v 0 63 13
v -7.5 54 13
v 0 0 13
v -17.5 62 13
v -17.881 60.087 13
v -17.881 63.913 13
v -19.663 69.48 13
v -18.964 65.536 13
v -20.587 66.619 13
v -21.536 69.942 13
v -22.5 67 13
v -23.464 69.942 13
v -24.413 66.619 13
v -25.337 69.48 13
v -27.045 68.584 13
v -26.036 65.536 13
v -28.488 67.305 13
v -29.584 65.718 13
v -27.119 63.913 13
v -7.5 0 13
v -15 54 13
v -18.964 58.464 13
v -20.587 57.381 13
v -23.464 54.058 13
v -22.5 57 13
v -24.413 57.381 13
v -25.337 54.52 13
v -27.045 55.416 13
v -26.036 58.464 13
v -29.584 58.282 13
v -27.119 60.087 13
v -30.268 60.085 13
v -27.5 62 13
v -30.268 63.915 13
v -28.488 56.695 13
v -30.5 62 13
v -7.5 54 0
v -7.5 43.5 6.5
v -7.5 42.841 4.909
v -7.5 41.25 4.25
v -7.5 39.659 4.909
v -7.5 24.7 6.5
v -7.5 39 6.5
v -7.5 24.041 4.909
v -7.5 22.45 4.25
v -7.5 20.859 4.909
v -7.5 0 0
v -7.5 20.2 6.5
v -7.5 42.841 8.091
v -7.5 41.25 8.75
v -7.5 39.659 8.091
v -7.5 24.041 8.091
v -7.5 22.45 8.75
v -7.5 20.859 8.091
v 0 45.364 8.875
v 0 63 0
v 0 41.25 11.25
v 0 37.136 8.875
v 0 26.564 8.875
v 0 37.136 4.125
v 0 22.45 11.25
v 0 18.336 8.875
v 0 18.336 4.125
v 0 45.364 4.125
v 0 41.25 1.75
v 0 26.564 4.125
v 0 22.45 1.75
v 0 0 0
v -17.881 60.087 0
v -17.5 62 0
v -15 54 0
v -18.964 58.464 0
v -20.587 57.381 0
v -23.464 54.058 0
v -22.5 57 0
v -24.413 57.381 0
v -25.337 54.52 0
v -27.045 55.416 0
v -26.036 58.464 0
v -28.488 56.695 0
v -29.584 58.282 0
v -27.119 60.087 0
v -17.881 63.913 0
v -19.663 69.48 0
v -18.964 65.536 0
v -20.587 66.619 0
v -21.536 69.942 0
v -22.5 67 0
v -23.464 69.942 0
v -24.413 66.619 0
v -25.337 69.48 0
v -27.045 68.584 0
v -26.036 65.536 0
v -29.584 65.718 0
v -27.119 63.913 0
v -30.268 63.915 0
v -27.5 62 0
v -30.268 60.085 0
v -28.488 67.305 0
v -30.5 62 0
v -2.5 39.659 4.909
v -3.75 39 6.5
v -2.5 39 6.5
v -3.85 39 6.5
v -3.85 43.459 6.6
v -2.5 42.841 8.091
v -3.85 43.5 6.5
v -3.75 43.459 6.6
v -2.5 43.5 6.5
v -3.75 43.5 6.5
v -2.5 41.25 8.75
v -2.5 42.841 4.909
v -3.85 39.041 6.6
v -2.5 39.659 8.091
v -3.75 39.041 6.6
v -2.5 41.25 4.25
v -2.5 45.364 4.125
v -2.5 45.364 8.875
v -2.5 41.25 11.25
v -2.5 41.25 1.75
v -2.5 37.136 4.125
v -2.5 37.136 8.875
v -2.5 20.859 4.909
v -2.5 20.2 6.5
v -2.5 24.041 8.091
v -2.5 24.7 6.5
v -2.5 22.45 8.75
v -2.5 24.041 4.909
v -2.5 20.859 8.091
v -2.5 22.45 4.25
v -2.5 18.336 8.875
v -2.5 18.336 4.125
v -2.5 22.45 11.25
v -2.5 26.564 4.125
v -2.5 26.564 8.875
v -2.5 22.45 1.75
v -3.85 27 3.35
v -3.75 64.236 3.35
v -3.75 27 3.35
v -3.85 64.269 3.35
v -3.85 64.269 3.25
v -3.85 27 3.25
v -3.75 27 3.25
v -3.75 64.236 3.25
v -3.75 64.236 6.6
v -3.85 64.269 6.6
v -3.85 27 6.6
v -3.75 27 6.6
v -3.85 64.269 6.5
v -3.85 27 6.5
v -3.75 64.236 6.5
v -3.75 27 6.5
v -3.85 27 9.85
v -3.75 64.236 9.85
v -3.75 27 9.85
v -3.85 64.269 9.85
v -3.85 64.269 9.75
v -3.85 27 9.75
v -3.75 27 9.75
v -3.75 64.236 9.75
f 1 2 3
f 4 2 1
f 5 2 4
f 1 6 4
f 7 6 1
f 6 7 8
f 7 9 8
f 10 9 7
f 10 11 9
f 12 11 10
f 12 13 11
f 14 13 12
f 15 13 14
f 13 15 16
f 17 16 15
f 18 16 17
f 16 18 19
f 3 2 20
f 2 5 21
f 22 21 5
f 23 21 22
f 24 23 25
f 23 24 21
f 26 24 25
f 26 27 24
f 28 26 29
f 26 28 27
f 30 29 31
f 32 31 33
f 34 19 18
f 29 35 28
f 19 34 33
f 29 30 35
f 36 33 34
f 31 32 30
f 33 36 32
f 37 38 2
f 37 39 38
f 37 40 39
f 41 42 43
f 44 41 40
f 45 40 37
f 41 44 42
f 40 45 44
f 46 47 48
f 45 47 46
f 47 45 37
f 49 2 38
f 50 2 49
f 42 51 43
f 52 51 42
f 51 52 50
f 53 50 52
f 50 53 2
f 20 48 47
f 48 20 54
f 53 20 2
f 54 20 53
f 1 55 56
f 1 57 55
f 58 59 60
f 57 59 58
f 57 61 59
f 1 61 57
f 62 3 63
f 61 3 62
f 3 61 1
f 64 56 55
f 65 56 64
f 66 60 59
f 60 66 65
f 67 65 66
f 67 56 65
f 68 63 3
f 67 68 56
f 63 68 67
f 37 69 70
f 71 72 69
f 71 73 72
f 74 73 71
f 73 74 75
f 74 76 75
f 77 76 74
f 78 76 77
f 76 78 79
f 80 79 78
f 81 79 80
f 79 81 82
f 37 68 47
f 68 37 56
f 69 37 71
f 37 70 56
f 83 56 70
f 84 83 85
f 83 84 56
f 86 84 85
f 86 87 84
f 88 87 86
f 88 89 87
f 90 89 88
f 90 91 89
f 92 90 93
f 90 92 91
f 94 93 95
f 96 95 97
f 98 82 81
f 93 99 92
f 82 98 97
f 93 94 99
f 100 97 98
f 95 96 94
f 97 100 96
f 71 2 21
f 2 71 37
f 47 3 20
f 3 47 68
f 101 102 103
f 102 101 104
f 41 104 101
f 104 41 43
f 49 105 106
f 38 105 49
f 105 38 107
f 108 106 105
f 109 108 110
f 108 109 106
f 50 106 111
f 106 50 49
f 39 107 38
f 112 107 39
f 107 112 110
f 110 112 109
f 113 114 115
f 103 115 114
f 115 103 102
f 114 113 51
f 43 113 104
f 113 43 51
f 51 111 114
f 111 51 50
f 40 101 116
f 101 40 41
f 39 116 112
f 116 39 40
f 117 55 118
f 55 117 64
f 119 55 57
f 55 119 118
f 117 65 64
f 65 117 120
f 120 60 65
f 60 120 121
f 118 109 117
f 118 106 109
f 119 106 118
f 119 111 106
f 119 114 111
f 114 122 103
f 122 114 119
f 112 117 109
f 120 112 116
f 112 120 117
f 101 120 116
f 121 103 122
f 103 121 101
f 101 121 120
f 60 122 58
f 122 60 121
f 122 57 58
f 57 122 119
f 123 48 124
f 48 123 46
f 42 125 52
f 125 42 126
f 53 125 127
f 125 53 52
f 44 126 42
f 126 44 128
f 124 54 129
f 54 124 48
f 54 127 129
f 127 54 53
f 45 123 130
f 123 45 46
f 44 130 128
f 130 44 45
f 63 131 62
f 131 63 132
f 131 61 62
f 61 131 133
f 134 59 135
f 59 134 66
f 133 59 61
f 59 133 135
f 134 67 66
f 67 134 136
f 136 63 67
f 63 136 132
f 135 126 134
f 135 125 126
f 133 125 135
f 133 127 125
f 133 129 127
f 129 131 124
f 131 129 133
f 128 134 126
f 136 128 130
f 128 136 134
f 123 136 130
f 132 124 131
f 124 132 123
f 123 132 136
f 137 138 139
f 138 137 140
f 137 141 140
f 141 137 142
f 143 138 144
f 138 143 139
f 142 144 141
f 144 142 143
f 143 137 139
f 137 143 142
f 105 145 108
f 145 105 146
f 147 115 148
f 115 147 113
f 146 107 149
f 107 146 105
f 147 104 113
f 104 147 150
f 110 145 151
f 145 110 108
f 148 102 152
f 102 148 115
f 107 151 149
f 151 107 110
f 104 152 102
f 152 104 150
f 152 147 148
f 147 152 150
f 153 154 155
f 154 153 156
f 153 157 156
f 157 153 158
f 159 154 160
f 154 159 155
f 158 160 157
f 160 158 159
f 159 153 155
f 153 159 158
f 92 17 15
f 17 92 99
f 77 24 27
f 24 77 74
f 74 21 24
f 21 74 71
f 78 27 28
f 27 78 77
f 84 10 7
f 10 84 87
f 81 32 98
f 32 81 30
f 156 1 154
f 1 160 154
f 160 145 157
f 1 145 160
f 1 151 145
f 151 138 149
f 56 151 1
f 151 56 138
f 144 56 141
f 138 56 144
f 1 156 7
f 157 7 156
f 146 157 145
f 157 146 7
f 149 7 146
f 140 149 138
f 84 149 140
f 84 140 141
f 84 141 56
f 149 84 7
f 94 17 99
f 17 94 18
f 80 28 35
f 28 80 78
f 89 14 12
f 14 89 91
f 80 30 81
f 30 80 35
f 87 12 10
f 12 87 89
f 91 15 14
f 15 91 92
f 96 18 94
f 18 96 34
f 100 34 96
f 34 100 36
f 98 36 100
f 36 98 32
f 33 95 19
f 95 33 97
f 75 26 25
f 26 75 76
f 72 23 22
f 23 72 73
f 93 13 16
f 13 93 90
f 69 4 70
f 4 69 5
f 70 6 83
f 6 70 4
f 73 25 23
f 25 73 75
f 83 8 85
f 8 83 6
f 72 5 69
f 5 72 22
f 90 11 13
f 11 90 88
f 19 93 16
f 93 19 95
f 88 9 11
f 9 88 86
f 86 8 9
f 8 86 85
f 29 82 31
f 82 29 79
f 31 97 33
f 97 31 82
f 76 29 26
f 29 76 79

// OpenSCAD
// Lower Toilet Seat Hinge Bracket
// Designed by Mike Creuzer Dec 30 2012 -  thingiverse@creuzer.com

// measurements are as the part is in use using the bottom back edge of the seat as reference for all measurements
// rotated on its side for printing when done

//Bracket bit

BracketWidth = 13; 
BracketLength = 54; 
BracketHeight = 7.5;

// Hinge upright bit to center of hinge hole
HingeWidth = BracketWidth; 
HingeLength = 9; 
HingeHeight = 15;

// Hinge Hole
//Radius
HingeHoleRadius = 5;
HingeHoleWallThickness = 3;
// Smaller number is smoother circle & slower rendering
HingeHoleRoundness = 0.01; 

//Mounting Holes
// diameter
MountingHoleSize = 4.5; 
// diameter
MountingHoleScrewHeadSize = 9.5; 
MountingHoleScrewHeadthickness = 2.5; 
FirstMountingHole = 12.75;
DistanceBetweenMountingHole =  18.8;
// smaller is more round. 6 ought to give you a pentagon
ScrewHeadRoundness = 5; 
// smaller is more round. 6 ought to give you a pentagon
ScrewRoundness = 2; 




rotate(a=[0,-90,0]){ // Rotate to the -90 so the low poly count circles put the angles up for easier printing.

// Make the mounting leg
difference(){
	cube(size = [BracketWidth,BracketLength,BracketHeight], center = false);
	// first hole
	translate(v = [BracketWidth * .5, BracketLength - FirstMountingHole, 0]) cylinder(h=BracketHeight, r=MountingHoleSize/2, $fs=ScrewRoundness);
	translate(v = [BracketWidth * .5, BracketLength - FirstMountingHole, 0]) cylinder(h=MountingHoleScrewHeadthickness, r = MountingHoleScrewHeadSize/2, $fs=ScrewHeadRoundness);
	// second hole
	translate(v = [BracketWidth * .5, BracketLength - FirstMountingHole - DistanceBetweenMountingHole, 0]) cylinder(h=BracketHeight, r=MountingHoleSize/2, $fs=ScrewRoundness);
	translate(v = [BracketWidth * .5, BracketLength - FirstMountingHole - DistanceBetweenMountingHole, 0]) cylinder(h=MountingHoleScrewHeadthickness, r = MountingHoleScrewHeadSize/2, $fs=ScrewHeadRoundness);

	// pin holes for strength
	translate(v = [BracketWidth * .25, BracketLength * .5, BracketHeight * .5]) cube(size = [.1,BracketLength,.1], center = false);
	translate(v = [BracketWidth * .5, BracketLength * .5, BracketHeight * .5]) cube(size = [.1,BracketLength,.1], center = false);
	translate(v = [BracketWidth * .75, BracketLength * .5, BracketHeight * .5]) cube(size = [.1,BracketLength,.1], center = false);
}

// Make the hinge bit
difference() { // Make the hinge bracket, then minus the hole
	hull(){ // Make the hinge bracket all fancy looking
		translate(v = [0, BracketLength, 0]) cube(size = [HingeWidth,HingeLength,HingeHeight], center = false); // The support post
		translate(v = [0, BracketLength +HingeHoleRadius + HingeHoleWallThickness, HingeHeight +BracketHeight]) rotate(a=[0,90,0]) cylinder(h = BracketWidth, r=HingeHoleRadius + HingeHoleWallThickness, center = false, $fa=HingeHoleRoundness); // The round hinge bit
	}

	// The Hinge Hole
	translate(v = [-1, BracketLength +HingeHoleRadius + HingeHoleWallThickness, HingeHeight  + BracketHeight]) rotate(a=[0,90,0]) cylinder(h = BracketWidth*2, r=HingeHoleRadius, center = false, $fa=HingeHoleRoundness); 

	// pin holes for strength
	translate(v = [BracketWidth * .25, BracketLength * .5, BracketHeight * .5]) cube(size = [.1,BracketLength,.1], center = false);
	translate(v = [BracketWidth * .5, BracketLength * .5, BracketHeight * .5]) cube(size = [.1,BracketLength,.1], center = false);
	translate(v = [BracketWidth * .75, BracketLength * .5, BracketHeight * .5]) cube(size = [.1,BracketLength,.1], center = false);
}

}
